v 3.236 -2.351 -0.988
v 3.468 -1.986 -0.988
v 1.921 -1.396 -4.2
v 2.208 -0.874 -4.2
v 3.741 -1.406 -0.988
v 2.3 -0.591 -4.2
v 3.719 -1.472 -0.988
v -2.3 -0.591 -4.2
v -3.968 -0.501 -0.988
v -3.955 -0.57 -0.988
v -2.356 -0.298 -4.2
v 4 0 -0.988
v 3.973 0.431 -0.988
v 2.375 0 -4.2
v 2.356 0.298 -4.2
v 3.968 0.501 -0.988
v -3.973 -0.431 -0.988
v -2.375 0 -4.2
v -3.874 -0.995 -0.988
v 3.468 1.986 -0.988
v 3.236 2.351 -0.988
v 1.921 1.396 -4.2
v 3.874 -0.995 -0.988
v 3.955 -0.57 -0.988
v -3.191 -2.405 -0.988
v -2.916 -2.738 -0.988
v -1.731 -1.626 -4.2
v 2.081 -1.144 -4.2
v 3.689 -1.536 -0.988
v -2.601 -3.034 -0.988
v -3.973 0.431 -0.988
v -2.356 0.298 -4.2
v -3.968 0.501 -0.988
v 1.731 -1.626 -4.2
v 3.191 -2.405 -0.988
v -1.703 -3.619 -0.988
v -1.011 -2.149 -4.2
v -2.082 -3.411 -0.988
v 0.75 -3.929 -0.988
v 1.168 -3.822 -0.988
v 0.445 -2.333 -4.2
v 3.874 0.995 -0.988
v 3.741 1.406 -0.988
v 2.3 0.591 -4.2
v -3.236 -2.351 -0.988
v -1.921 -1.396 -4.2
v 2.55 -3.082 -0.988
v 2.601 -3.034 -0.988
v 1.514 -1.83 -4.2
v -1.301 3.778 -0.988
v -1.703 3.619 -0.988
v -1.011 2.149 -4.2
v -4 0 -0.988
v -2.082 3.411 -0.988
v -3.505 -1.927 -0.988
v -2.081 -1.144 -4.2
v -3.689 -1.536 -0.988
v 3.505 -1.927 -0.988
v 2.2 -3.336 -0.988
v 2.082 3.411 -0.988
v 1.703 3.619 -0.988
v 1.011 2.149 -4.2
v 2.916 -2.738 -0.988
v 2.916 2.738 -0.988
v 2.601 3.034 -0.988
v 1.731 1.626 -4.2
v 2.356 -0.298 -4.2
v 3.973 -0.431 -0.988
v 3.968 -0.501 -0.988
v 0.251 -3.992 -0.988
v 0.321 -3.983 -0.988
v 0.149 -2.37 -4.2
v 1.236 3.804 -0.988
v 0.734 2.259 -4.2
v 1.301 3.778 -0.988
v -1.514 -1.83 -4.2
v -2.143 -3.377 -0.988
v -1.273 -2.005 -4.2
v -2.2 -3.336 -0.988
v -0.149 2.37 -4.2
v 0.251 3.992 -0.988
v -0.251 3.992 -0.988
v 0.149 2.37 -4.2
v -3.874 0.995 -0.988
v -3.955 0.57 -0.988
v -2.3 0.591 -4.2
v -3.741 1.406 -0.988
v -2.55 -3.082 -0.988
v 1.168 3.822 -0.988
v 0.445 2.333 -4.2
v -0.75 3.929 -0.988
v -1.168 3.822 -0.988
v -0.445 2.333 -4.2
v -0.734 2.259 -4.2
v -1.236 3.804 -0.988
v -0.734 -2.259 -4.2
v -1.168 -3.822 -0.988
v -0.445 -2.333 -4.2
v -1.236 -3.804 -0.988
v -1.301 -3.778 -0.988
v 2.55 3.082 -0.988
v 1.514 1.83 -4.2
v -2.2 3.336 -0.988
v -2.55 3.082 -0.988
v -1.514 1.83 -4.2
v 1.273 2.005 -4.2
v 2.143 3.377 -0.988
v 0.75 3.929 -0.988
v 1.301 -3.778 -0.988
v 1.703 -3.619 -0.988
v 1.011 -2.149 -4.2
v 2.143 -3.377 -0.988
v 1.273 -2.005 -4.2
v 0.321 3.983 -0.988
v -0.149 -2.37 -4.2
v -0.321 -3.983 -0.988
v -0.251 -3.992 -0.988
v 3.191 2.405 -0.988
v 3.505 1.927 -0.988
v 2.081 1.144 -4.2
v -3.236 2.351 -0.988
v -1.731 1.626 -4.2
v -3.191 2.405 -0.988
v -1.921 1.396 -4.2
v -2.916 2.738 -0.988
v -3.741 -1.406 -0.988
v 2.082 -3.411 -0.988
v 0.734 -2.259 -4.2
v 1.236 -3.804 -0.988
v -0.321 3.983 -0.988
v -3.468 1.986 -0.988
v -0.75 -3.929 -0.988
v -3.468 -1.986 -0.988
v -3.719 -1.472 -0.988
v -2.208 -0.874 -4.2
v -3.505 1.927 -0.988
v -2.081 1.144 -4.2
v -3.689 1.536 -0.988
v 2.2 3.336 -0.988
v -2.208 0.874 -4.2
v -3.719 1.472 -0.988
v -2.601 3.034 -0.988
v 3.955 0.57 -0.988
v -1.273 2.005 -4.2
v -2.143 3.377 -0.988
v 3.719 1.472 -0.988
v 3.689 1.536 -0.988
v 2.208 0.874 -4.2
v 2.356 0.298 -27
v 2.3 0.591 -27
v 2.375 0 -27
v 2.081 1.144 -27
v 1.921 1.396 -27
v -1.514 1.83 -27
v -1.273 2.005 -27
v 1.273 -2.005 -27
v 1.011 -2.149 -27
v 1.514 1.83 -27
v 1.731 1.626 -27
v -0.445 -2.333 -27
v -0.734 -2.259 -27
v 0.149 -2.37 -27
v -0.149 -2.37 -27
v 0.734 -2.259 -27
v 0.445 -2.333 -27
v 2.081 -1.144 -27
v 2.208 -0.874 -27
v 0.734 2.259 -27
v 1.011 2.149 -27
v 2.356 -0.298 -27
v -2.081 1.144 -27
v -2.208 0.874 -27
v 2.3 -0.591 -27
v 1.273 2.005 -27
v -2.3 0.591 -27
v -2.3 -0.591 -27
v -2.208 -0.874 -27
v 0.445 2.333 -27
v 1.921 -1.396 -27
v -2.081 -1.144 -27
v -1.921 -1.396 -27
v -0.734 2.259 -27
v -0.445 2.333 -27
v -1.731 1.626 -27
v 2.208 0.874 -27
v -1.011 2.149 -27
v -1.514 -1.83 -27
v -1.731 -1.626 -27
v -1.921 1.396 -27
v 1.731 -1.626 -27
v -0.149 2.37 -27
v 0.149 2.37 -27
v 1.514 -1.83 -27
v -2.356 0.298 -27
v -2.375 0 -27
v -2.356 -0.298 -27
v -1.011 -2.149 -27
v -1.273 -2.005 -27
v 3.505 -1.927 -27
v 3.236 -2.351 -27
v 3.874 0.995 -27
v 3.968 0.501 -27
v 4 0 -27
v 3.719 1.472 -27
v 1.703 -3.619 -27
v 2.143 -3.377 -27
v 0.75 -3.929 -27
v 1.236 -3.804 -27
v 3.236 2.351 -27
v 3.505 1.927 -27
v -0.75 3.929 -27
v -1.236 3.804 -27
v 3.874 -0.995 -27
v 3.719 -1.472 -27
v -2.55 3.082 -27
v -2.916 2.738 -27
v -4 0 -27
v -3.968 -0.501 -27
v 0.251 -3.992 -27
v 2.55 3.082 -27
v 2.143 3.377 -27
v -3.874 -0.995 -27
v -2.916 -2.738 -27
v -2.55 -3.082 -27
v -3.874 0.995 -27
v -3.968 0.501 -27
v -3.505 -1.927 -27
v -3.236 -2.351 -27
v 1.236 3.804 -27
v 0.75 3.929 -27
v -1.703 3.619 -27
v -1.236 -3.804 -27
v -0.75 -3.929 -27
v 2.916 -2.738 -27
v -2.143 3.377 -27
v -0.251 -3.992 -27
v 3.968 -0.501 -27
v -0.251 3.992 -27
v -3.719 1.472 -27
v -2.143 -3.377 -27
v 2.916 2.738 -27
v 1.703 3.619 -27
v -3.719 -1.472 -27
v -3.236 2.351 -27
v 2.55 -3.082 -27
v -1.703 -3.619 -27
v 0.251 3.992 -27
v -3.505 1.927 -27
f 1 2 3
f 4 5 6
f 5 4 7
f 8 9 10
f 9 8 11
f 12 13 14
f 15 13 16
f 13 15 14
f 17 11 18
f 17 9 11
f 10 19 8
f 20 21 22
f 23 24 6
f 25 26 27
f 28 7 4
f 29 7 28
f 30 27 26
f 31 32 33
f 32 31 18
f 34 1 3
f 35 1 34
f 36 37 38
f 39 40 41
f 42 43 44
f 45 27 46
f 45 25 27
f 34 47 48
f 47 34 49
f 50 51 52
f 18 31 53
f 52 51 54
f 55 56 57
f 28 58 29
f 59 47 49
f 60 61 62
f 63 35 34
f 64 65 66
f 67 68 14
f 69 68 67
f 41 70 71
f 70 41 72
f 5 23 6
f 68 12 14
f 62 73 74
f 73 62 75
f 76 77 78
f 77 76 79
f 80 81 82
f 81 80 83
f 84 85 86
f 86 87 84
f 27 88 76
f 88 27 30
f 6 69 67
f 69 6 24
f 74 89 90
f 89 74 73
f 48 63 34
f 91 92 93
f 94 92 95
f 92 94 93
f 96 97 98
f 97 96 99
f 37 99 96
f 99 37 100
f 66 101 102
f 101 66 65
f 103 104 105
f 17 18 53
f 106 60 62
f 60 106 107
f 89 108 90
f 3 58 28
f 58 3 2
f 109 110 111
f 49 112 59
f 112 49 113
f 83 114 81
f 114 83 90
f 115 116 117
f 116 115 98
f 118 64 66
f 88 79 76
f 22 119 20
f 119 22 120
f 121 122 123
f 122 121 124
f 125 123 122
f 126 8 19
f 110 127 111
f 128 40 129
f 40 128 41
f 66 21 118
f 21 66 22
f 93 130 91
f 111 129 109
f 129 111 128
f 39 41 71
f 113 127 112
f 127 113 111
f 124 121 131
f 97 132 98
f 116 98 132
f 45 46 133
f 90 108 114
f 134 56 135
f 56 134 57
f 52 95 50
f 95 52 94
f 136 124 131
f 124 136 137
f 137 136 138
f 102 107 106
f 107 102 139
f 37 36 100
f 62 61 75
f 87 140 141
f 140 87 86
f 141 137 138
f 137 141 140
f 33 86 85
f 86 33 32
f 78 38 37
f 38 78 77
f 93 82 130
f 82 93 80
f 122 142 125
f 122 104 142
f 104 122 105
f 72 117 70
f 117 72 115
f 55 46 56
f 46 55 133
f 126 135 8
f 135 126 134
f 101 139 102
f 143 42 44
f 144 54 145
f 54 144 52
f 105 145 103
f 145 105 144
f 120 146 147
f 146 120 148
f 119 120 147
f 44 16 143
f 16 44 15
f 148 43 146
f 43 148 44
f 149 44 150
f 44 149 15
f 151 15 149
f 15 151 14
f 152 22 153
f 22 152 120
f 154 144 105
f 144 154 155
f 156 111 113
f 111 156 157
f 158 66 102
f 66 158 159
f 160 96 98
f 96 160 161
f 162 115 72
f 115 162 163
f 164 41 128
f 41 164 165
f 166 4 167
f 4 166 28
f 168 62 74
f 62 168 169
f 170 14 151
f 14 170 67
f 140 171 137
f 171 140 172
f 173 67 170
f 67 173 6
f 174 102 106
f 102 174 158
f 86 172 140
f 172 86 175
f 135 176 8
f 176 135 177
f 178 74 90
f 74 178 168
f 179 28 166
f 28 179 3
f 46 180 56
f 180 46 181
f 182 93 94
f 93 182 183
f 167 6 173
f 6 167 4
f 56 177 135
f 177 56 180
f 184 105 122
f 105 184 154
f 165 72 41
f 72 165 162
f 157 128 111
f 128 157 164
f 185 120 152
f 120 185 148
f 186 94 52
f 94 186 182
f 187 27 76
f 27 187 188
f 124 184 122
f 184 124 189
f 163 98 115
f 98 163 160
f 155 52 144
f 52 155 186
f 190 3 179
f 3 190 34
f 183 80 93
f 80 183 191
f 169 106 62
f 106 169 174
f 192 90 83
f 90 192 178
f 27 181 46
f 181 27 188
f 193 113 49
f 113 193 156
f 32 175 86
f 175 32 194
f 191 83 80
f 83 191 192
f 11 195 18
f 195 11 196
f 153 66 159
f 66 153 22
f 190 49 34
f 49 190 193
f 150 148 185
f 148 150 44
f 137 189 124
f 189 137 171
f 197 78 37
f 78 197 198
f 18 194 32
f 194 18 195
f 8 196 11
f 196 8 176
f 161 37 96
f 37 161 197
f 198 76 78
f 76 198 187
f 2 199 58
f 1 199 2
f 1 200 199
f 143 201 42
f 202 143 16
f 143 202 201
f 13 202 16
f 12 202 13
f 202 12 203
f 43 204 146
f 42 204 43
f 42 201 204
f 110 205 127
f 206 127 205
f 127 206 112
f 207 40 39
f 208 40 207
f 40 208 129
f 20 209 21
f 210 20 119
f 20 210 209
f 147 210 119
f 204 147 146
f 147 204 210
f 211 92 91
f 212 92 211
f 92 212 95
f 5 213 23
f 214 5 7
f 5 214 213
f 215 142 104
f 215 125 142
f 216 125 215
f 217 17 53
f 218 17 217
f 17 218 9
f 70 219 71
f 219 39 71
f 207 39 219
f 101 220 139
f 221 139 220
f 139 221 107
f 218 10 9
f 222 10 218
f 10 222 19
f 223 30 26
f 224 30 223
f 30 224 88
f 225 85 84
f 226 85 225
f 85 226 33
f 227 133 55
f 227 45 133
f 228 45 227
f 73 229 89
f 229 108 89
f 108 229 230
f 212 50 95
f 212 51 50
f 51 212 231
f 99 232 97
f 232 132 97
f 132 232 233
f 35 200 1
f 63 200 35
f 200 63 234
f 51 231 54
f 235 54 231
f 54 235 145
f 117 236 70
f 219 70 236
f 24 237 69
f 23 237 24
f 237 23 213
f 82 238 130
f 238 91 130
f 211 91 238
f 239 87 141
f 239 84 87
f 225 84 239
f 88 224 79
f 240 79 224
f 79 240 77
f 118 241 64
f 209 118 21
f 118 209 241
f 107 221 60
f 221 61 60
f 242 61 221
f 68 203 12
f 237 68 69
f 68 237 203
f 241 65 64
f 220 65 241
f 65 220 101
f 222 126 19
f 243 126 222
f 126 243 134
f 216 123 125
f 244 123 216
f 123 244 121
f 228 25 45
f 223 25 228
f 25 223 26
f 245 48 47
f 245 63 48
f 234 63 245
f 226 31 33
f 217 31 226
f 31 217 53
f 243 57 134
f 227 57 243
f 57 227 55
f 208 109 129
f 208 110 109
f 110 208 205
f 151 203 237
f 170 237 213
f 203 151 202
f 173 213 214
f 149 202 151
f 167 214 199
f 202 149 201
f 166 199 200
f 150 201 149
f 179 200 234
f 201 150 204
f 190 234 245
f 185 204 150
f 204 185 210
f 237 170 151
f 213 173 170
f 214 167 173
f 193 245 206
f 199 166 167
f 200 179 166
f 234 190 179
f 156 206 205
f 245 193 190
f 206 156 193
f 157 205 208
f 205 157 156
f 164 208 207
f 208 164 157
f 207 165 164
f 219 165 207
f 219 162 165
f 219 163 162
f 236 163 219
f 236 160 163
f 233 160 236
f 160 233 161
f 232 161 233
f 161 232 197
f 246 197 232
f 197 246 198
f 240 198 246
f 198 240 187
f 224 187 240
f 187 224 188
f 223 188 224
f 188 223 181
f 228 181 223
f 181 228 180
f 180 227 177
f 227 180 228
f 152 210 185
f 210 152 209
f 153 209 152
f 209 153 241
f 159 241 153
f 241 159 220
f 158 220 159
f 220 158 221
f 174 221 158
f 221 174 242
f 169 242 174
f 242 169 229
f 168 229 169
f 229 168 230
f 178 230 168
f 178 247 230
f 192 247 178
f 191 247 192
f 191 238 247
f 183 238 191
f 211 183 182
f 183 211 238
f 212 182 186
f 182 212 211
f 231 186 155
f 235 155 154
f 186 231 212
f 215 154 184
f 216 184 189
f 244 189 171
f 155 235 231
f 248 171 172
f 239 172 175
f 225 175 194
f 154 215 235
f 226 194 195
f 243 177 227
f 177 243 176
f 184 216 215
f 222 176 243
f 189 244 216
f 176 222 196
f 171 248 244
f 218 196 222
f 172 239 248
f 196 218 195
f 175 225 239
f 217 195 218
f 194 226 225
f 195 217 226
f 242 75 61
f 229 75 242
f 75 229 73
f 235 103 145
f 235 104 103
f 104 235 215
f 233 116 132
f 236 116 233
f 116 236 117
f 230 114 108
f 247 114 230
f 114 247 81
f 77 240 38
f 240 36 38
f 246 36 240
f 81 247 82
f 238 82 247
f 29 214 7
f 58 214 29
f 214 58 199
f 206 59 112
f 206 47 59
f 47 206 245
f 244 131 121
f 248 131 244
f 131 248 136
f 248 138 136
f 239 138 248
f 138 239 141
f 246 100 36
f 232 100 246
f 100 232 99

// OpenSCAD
$fn = 50;

difference() {
	union() {
		translate(v = [0, 0, -27.0]) {
			cylinder(h = 27, r = 4.0);
		}
	}
	union() {
		translate(v = [0, 0, 0]) {
			rotate(a = [0, 0, 0]) {
				difference() {
					union() {
						translate(v = [0, 0, -30.0]) {
							cylinder(h = 30, r = 2.25);
						}
						translate(v = [0, 0, -4.2]) {
							cylinder(h = 4.2, r1 = 2.375, r2 = 4.5);
						}
						translate(v = [0, 0, -30.0]) {
							cylinder(h = 30, r = 2.375);
						}
						translate(v = [0, 0, -30.0]) {
							cylinder(h = 30, r = 2.25);
						}
					}
					union();
				}
			}
		}
	}
}
